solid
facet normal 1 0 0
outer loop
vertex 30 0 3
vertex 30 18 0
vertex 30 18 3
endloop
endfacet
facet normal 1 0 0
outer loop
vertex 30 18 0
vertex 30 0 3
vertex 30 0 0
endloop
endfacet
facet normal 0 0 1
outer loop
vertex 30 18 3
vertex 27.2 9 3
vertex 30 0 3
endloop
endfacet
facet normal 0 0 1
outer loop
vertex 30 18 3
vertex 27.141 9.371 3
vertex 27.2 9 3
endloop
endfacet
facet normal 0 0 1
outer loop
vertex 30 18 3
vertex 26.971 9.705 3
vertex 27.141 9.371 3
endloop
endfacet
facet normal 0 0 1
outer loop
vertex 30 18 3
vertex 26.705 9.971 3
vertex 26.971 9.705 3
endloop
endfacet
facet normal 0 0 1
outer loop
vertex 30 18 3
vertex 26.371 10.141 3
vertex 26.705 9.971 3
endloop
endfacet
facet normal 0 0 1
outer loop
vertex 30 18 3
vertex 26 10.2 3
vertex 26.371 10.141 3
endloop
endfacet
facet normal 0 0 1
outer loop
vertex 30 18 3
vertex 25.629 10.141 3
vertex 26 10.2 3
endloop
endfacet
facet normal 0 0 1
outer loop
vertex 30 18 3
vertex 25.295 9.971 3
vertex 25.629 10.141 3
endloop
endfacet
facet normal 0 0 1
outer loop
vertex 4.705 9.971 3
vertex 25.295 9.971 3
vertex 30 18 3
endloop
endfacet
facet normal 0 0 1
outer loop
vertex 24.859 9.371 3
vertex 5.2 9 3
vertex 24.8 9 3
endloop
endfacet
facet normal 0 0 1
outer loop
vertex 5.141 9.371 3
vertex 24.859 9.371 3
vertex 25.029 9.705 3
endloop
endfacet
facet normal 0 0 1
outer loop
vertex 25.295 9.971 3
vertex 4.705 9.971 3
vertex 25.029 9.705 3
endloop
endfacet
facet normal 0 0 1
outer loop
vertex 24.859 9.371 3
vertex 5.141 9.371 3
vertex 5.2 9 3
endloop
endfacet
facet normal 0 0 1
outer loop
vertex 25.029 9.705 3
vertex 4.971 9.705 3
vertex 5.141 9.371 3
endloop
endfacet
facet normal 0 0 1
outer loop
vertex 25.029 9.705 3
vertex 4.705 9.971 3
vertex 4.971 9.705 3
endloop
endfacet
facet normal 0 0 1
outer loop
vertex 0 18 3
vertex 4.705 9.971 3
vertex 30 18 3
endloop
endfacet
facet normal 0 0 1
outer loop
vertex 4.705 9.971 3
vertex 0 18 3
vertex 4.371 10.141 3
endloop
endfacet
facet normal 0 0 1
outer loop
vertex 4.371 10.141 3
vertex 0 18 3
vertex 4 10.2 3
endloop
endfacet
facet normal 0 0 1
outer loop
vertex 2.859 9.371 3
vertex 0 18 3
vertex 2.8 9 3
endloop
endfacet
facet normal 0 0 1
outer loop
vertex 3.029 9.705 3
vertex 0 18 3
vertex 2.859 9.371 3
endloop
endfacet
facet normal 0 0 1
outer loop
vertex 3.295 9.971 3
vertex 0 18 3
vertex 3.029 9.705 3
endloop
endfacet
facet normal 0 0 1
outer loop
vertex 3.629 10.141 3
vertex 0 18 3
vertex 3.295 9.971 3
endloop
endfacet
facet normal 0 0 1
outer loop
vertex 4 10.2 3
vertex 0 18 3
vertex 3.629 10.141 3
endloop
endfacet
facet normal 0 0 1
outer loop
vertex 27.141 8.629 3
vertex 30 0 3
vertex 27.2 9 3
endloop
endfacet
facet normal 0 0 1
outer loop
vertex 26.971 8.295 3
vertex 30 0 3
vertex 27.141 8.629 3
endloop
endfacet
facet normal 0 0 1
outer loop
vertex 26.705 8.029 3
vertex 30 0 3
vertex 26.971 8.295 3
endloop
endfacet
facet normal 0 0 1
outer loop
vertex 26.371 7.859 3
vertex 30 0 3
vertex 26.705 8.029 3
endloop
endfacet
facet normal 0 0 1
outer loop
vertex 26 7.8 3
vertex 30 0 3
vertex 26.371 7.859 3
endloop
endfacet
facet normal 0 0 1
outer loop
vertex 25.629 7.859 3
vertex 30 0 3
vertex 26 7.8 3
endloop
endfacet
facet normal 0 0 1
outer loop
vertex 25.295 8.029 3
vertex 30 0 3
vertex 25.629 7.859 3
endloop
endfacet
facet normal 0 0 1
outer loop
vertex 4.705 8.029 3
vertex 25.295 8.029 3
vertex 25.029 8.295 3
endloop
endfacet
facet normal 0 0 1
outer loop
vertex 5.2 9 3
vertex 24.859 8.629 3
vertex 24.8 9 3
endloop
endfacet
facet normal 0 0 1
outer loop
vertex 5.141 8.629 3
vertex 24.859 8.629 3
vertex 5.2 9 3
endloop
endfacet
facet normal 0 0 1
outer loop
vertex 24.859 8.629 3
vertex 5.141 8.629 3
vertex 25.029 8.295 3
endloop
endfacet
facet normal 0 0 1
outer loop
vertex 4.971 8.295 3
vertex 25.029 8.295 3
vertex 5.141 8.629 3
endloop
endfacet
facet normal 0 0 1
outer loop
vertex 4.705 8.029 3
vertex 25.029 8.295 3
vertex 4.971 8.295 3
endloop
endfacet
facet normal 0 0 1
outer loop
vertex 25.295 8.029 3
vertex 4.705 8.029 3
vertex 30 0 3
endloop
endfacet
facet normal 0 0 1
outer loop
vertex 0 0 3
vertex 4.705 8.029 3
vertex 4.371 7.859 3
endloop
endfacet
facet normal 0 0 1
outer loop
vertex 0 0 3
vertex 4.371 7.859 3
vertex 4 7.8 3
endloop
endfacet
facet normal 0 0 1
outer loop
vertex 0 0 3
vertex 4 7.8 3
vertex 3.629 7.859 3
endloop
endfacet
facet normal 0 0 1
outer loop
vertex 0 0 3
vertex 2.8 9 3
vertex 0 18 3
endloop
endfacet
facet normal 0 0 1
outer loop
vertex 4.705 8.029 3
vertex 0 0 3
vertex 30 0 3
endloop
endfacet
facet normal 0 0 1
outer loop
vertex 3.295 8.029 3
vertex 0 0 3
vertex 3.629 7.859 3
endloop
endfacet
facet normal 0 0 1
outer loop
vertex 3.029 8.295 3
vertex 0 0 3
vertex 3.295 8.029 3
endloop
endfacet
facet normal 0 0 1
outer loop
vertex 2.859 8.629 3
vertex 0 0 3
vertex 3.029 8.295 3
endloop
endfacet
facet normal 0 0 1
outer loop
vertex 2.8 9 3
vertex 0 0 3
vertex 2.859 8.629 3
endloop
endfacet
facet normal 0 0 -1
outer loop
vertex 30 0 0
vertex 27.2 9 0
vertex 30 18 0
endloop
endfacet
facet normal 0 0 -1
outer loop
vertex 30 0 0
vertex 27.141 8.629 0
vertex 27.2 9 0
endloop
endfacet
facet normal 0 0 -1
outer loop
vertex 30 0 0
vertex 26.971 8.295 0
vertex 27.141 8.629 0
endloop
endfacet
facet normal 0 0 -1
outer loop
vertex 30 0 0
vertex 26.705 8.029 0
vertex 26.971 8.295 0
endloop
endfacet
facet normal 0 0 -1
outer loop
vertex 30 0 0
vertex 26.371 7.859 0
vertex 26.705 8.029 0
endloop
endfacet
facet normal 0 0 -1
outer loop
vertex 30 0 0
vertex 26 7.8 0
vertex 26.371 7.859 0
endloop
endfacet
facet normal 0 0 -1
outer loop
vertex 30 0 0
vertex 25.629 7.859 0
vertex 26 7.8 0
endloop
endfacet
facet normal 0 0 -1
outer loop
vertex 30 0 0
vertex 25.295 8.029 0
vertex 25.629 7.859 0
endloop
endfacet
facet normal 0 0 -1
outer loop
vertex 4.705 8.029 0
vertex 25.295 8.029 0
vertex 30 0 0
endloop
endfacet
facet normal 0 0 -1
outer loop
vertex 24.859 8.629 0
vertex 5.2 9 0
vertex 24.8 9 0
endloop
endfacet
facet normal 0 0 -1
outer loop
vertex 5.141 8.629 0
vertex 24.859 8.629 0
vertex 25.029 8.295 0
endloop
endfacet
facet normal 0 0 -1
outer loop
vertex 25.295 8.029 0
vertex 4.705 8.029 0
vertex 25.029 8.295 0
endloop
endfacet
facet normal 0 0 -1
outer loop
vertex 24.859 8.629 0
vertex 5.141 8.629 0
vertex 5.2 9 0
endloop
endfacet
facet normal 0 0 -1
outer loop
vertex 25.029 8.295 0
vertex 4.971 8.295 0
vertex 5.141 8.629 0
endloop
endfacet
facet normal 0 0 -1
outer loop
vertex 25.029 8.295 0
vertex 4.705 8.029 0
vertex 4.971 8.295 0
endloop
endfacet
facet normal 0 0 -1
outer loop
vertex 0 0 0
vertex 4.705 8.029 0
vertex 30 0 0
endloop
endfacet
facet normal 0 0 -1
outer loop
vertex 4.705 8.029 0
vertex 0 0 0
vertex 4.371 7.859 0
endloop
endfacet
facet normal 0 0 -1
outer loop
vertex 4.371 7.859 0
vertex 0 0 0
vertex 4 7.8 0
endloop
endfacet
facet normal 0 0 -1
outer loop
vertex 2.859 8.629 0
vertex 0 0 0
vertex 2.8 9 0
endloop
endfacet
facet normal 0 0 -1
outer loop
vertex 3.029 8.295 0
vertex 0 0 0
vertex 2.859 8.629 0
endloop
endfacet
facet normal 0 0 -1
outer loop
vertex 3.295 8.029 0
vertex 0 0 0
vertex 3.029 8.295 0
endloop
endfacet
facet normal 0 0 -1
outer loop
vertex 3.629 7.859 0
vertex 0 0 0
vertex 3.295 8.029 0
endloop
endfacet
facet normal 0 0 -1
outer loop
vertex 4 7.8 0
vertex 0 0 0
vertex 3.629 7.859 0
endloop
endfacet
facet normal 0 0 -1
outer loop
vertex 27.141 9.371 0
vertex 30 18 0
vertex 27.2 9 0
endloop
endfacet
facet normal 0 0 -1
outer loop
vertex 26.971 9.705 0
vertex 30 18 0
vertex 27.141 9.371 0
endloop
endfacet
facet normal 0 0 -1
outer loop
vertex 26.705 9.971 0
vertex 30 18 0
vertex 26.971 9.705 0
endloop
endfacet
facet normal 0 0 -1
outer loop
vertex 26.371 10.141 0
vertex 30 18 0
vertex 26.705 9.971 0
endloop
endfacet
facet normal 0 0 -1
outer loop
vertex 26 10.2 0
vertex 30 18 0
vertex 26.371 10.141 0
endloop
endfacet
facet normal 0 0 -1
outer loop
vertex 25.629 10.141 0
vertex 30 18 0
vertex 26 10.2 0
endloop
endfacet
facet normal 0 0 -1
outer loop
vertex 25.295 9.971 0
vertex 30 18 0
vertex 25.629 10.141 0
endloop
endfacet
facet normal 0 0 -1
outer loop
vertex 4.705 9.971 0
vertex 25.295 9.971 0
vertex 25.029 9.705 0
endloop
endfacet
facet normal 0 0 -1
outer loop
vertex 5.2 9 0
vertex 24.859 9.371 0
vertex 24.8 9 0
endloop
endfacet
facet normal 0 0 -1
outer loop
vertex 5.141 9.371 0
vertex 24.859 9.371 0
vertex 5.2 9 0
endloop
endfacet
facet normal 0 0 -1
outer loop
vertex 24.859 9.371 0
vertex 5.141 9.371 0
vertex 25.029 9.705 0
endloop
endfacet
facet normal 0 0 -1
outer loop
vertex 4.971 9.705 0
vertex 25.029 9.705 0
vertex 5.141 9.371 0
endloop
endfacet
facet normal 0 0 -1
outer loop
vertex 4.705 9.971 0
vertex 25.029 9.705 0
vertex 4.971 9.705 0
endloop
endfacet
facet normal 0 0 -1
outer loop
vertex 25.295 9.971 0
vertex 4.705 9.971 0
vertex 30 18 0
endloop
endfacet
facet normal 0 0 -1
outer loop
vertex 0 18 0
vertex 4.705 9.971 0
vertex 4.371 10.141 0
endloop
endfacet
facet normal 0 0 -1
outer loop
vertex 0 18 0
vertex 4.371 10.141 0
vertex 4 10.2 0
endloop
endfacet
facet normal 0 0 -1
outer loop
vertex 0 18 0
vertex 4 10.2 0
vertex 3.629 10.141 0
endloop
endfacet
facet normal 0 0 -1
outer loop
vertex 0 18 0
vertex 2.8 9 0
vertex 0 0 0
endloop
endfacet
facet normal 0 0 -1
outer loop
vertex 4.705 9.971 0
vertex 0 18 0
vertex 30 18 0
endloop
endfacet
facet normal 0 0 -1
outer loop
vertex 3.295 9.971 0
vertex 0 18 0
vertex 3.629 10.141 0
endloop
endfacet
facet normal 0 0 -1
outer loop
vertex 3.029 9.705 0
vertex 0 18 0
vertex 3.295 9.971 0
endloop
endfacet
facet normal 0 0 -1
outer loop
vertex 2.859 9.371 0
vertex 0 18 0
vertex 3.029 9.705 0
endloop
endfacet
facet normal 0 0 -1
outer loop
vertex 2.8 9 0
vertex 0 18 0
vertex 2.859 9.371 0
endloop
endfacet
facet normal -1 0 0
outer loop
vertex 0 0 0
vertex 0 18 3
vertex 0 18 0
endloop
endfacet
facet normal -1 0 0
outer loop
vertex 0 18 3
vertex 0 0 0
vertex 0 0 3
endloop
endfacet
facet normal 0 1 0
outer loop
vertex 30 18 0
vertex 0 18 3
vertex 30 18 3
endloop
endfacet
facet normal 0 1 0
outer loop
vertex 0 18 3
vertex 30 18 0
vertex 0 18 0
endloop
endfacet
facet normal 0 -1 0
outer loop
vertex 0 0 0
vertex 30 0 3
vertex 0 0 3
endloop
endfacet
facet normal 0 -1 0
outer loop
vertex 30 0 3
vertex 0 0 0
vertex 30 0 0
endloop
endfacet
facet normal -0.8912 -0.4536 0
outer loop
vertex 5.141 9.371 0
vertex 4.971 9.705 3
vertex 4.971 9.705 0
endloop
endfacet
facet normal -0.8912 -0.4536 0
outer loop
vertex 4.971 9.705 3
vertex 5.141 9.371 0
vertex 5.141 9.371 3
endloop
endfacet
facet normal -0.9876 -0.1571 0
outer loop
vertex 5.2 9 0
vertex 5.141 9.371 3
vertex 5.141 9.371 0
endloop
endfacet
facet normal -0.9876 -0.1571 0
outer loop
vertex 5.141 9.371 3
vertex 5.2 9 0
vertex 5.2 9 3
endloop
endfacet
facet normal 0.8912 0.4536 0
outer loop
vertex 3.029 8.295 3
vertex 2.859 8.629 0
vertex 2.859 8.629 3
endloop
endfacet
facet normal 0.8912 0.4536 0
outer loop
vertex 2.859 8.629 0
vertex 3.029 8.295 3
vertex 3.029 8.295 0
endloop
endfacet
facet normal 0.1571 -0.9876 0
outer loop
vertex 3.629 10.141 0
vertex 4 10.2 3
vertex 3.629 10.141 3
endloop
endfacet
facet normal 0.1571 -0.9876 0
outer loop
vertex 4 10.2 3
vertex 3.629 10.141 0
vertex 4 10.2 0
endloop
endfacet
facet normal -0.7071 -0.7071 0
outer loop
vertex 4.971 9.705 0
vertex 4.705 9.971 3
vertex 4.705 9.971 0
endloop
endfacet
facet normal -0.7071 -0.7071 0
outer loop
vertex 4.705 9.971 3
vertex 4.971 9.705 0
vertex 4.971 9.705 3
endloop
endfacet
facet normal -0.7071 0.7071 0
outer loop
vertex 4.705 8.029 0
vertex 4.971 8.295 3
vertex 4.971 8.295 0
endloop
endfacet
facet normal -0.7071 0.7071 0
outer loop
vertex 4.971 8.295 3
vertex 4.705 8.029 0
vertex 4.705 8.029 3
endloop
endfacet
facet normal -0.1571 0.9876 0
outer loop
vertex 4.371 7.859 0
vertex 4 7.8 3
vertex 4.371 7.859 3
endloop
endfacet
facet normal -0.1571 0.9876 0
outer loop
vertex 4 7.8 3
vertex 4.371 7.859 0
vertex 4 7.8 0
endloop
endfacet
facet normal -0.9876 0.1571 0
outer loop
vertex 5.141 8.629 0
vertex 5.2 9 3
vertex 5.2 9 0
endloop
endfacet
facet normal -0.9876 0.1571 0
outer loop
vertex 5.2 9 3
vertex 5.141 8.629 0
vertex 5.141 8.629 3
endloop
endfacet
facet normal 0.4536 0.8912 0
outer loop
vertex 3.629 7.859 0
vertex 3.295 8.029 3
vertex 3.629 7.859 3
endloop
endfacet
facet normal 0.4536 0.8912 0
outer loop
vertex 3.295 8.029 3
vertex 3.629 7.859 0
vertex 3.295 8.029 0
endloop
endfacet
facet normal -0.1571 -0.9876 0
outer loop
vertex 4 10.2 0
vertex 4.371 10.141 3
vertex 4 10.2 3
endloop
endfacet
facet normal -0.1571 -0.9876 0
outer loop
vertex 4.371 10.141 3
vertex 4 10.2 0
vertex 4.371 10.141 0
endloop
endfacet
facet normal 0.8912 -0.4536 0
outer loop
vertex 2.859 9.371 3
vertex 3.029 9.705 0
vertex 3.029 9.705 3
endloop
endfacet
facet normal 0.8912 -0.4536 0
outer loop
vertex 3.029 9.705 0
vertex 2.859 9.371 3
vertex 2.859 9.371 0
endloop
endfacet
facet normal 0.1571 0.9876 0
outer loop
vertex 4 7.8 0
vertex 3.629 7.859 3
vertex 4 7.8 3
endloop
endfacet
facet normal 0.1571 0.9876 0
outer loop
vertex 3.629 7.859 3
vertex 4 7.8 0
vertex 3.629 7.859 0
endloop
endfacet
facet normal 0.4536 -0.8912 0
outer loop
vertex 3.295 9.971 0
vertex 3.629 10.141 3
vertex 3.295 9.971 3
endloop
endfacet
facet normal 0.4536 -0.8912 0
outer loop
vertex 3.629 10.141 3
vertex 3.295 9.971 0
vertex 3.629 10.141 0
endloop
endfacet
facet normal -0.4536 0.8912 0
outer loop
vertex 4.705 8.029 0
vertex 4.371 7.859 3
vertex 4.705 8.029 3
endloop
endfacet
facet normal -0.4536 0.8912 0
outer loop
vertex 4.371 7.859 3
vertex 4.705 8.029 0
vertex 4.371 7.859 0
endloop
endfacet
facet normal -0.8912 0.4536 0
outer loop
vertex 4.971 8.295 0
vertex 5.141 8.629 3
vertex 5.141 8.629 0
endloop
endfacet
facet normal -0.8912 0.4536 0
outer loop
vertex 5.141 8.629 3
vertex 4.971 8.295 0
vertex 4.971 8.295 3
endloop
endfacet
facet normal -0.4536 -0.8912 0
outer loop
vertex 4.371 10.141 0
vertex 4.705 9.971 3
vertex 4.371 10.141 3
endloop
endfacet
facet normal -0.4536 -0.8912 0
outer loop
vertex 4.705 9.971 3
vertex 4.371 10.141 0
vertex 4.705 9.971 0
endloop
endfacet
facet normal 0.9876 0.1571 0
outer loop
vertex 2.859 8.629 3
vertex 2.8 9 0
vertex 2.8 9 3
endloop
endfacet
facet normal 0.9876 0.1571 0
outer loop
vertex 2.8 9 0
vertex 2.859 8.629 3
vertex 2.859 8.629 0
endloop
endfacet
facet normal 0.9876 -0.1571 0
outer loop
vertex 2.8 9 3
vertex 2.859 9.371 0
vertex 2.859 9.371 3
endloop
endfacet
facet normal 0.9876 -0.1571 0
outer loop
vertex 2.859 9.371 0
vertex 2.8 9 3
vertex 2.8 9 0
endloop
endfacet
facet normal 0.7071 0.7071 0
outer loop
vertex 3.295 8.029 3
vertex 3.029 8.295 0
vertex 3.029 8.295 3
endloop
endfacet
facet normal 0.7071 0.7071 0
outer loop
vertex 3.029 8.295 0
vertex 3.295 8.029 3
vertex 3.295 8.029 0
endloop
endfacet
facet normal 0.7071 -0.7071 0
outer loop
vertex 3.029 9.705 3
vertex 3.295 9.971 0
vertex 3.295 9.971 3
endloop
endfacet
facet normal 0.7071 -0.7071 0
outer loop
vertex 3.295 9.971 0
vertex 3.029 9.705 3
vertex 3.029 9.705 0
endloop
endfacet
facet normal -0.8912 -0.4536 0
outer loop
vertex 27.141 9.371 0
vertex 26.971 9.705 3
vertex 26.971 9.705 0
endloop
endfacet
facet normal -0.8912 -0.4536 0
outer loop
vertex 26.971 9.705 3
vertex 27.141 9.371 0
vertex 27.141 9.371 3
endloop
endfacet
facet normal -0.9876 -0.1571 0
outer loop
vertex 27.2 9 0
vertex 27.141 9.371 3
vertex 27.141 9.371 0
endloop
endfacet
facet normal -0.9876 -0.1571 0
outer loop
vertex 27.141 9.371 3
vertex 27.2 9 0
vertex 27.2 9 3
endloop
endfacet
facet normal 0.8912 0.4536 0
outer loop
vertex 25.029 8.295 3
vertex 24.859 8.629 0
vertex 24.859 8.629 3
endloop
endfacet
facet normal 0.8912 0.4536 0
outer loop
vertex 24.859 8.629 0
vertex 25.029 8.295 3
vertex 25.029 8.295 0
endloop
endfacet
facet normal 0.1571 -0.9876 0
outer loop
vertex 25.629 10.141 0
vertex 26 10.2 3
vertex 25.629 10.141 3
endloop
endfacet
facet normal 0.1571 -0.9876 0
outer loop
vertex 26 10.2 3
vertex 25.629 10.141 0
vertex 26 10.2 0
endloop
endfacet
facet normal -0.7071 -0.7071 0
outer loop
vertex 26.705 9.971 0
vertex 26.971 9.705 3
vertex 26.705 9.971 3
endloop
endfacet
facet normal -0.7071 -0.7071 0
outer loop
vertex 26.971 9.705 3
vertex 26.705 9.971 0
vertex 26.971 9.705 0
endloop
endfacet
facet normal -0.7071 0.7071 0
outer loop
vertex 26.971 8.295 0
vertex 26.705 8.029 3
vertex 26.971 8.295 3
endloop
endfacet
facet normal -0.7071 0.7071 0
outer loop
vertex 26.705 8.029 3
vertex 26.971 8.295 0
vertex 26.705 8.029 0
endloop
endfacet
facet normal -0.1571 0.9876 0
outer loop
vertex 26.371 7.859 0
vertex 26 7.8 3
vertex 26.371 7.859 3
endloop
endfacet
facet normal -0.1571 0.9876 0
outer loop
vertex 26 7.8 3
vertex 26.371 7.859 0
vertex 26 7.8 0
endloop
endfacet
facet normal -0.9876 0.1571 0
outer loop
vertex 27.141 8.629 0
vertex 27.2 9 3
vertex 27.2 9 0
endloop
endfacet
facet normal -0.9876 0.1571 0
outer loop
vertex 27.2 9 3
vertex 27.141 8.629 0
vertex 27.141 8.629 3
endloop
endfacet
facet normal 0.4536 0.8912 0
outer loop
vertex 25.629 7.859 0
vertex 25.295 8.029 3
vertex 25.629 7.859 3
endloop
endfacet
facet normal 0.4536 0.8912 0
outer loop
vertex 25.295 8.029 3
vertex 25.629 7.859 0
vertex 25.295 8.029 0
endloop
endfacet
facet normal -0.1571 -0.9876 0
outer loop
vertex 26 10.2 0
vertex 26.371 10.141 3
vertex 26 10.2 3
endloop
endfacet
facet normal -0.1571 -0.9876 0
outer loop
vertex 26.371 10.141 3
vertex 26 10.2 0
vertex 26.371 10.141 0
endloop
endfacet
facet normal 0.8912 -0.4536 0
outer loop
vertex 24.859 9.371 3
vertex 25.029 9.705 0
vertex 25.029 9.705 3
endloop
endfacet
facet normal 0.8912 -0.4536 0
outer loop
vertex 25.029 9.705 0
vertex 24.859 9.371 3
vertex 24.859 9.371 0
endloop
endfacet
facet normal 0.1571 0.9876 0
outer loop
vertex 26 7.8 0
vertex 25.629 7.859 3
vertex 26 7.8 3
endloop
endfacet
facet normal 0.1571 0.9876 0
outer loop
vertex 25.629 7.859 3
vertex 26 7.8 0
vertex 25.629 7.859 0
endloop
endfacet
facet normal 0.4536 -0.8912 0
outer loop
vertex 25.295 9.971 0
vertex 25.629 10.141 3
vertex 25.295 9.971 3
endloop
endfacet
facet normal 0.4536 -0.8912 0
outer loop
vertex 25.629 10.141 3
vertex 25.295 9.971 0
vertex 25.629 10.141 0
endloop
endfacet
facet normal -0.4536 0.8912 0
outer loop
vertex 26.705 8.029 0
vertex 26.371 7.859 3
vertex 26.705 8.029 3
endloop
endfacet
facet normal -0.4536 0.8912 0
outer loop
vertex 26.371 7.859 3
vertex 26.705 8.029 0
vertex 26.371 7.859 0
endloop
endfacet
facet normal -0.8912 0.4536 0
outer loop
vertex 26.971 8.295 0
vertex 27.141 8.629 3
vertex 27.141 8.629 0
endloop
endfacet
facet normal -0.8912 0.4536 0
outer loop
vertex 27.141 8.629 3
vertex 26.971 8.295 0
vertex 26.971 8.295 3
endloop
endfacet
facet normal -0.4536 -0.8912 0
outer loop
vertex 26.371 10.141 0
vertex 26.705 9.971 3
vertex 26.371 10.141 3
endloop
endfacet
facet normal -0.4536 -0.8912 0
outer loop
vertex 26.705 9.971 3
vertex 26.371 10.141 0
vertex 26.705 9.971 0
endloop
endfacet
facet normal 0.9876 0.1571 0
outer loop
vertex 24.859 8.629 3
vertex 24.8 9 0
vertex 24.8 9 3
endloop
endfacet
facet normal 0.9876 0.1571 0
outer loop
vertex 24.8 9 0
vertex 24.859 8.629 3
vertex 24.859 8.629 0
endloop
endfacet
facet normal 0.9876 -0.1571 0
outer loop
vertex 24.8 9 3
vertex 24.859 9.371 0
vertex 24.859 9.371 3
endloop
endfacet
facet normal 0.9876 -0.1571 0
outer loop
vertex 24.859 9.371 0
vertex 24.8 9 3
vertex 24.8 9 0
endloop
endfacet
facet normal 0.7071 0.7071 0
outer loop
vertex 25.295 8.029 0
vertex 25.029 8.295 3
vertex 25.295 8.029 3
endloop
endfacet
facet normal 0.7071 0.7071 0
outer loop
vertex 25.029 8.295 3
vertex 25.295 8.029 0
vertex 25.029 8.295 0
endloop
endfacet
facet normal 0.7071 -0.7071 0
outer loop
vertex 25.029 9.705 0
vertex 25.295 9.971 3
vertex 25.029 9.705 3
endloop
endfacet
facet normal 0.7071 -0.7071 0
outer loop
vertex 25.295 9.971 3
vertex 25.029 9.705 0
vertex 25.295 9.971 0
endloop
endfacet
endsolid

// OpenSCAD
module tof_mount(){
  difference(){
    cube([30,18,3]);
    translate([4,9,-0.1]) cylinder(h=3.2,r=1.2,$fn=20);
    translate([26,9,-0.1]) cylinder(h=3.2,r=1.2,$fn=20);
  }
}
tof_mount();
